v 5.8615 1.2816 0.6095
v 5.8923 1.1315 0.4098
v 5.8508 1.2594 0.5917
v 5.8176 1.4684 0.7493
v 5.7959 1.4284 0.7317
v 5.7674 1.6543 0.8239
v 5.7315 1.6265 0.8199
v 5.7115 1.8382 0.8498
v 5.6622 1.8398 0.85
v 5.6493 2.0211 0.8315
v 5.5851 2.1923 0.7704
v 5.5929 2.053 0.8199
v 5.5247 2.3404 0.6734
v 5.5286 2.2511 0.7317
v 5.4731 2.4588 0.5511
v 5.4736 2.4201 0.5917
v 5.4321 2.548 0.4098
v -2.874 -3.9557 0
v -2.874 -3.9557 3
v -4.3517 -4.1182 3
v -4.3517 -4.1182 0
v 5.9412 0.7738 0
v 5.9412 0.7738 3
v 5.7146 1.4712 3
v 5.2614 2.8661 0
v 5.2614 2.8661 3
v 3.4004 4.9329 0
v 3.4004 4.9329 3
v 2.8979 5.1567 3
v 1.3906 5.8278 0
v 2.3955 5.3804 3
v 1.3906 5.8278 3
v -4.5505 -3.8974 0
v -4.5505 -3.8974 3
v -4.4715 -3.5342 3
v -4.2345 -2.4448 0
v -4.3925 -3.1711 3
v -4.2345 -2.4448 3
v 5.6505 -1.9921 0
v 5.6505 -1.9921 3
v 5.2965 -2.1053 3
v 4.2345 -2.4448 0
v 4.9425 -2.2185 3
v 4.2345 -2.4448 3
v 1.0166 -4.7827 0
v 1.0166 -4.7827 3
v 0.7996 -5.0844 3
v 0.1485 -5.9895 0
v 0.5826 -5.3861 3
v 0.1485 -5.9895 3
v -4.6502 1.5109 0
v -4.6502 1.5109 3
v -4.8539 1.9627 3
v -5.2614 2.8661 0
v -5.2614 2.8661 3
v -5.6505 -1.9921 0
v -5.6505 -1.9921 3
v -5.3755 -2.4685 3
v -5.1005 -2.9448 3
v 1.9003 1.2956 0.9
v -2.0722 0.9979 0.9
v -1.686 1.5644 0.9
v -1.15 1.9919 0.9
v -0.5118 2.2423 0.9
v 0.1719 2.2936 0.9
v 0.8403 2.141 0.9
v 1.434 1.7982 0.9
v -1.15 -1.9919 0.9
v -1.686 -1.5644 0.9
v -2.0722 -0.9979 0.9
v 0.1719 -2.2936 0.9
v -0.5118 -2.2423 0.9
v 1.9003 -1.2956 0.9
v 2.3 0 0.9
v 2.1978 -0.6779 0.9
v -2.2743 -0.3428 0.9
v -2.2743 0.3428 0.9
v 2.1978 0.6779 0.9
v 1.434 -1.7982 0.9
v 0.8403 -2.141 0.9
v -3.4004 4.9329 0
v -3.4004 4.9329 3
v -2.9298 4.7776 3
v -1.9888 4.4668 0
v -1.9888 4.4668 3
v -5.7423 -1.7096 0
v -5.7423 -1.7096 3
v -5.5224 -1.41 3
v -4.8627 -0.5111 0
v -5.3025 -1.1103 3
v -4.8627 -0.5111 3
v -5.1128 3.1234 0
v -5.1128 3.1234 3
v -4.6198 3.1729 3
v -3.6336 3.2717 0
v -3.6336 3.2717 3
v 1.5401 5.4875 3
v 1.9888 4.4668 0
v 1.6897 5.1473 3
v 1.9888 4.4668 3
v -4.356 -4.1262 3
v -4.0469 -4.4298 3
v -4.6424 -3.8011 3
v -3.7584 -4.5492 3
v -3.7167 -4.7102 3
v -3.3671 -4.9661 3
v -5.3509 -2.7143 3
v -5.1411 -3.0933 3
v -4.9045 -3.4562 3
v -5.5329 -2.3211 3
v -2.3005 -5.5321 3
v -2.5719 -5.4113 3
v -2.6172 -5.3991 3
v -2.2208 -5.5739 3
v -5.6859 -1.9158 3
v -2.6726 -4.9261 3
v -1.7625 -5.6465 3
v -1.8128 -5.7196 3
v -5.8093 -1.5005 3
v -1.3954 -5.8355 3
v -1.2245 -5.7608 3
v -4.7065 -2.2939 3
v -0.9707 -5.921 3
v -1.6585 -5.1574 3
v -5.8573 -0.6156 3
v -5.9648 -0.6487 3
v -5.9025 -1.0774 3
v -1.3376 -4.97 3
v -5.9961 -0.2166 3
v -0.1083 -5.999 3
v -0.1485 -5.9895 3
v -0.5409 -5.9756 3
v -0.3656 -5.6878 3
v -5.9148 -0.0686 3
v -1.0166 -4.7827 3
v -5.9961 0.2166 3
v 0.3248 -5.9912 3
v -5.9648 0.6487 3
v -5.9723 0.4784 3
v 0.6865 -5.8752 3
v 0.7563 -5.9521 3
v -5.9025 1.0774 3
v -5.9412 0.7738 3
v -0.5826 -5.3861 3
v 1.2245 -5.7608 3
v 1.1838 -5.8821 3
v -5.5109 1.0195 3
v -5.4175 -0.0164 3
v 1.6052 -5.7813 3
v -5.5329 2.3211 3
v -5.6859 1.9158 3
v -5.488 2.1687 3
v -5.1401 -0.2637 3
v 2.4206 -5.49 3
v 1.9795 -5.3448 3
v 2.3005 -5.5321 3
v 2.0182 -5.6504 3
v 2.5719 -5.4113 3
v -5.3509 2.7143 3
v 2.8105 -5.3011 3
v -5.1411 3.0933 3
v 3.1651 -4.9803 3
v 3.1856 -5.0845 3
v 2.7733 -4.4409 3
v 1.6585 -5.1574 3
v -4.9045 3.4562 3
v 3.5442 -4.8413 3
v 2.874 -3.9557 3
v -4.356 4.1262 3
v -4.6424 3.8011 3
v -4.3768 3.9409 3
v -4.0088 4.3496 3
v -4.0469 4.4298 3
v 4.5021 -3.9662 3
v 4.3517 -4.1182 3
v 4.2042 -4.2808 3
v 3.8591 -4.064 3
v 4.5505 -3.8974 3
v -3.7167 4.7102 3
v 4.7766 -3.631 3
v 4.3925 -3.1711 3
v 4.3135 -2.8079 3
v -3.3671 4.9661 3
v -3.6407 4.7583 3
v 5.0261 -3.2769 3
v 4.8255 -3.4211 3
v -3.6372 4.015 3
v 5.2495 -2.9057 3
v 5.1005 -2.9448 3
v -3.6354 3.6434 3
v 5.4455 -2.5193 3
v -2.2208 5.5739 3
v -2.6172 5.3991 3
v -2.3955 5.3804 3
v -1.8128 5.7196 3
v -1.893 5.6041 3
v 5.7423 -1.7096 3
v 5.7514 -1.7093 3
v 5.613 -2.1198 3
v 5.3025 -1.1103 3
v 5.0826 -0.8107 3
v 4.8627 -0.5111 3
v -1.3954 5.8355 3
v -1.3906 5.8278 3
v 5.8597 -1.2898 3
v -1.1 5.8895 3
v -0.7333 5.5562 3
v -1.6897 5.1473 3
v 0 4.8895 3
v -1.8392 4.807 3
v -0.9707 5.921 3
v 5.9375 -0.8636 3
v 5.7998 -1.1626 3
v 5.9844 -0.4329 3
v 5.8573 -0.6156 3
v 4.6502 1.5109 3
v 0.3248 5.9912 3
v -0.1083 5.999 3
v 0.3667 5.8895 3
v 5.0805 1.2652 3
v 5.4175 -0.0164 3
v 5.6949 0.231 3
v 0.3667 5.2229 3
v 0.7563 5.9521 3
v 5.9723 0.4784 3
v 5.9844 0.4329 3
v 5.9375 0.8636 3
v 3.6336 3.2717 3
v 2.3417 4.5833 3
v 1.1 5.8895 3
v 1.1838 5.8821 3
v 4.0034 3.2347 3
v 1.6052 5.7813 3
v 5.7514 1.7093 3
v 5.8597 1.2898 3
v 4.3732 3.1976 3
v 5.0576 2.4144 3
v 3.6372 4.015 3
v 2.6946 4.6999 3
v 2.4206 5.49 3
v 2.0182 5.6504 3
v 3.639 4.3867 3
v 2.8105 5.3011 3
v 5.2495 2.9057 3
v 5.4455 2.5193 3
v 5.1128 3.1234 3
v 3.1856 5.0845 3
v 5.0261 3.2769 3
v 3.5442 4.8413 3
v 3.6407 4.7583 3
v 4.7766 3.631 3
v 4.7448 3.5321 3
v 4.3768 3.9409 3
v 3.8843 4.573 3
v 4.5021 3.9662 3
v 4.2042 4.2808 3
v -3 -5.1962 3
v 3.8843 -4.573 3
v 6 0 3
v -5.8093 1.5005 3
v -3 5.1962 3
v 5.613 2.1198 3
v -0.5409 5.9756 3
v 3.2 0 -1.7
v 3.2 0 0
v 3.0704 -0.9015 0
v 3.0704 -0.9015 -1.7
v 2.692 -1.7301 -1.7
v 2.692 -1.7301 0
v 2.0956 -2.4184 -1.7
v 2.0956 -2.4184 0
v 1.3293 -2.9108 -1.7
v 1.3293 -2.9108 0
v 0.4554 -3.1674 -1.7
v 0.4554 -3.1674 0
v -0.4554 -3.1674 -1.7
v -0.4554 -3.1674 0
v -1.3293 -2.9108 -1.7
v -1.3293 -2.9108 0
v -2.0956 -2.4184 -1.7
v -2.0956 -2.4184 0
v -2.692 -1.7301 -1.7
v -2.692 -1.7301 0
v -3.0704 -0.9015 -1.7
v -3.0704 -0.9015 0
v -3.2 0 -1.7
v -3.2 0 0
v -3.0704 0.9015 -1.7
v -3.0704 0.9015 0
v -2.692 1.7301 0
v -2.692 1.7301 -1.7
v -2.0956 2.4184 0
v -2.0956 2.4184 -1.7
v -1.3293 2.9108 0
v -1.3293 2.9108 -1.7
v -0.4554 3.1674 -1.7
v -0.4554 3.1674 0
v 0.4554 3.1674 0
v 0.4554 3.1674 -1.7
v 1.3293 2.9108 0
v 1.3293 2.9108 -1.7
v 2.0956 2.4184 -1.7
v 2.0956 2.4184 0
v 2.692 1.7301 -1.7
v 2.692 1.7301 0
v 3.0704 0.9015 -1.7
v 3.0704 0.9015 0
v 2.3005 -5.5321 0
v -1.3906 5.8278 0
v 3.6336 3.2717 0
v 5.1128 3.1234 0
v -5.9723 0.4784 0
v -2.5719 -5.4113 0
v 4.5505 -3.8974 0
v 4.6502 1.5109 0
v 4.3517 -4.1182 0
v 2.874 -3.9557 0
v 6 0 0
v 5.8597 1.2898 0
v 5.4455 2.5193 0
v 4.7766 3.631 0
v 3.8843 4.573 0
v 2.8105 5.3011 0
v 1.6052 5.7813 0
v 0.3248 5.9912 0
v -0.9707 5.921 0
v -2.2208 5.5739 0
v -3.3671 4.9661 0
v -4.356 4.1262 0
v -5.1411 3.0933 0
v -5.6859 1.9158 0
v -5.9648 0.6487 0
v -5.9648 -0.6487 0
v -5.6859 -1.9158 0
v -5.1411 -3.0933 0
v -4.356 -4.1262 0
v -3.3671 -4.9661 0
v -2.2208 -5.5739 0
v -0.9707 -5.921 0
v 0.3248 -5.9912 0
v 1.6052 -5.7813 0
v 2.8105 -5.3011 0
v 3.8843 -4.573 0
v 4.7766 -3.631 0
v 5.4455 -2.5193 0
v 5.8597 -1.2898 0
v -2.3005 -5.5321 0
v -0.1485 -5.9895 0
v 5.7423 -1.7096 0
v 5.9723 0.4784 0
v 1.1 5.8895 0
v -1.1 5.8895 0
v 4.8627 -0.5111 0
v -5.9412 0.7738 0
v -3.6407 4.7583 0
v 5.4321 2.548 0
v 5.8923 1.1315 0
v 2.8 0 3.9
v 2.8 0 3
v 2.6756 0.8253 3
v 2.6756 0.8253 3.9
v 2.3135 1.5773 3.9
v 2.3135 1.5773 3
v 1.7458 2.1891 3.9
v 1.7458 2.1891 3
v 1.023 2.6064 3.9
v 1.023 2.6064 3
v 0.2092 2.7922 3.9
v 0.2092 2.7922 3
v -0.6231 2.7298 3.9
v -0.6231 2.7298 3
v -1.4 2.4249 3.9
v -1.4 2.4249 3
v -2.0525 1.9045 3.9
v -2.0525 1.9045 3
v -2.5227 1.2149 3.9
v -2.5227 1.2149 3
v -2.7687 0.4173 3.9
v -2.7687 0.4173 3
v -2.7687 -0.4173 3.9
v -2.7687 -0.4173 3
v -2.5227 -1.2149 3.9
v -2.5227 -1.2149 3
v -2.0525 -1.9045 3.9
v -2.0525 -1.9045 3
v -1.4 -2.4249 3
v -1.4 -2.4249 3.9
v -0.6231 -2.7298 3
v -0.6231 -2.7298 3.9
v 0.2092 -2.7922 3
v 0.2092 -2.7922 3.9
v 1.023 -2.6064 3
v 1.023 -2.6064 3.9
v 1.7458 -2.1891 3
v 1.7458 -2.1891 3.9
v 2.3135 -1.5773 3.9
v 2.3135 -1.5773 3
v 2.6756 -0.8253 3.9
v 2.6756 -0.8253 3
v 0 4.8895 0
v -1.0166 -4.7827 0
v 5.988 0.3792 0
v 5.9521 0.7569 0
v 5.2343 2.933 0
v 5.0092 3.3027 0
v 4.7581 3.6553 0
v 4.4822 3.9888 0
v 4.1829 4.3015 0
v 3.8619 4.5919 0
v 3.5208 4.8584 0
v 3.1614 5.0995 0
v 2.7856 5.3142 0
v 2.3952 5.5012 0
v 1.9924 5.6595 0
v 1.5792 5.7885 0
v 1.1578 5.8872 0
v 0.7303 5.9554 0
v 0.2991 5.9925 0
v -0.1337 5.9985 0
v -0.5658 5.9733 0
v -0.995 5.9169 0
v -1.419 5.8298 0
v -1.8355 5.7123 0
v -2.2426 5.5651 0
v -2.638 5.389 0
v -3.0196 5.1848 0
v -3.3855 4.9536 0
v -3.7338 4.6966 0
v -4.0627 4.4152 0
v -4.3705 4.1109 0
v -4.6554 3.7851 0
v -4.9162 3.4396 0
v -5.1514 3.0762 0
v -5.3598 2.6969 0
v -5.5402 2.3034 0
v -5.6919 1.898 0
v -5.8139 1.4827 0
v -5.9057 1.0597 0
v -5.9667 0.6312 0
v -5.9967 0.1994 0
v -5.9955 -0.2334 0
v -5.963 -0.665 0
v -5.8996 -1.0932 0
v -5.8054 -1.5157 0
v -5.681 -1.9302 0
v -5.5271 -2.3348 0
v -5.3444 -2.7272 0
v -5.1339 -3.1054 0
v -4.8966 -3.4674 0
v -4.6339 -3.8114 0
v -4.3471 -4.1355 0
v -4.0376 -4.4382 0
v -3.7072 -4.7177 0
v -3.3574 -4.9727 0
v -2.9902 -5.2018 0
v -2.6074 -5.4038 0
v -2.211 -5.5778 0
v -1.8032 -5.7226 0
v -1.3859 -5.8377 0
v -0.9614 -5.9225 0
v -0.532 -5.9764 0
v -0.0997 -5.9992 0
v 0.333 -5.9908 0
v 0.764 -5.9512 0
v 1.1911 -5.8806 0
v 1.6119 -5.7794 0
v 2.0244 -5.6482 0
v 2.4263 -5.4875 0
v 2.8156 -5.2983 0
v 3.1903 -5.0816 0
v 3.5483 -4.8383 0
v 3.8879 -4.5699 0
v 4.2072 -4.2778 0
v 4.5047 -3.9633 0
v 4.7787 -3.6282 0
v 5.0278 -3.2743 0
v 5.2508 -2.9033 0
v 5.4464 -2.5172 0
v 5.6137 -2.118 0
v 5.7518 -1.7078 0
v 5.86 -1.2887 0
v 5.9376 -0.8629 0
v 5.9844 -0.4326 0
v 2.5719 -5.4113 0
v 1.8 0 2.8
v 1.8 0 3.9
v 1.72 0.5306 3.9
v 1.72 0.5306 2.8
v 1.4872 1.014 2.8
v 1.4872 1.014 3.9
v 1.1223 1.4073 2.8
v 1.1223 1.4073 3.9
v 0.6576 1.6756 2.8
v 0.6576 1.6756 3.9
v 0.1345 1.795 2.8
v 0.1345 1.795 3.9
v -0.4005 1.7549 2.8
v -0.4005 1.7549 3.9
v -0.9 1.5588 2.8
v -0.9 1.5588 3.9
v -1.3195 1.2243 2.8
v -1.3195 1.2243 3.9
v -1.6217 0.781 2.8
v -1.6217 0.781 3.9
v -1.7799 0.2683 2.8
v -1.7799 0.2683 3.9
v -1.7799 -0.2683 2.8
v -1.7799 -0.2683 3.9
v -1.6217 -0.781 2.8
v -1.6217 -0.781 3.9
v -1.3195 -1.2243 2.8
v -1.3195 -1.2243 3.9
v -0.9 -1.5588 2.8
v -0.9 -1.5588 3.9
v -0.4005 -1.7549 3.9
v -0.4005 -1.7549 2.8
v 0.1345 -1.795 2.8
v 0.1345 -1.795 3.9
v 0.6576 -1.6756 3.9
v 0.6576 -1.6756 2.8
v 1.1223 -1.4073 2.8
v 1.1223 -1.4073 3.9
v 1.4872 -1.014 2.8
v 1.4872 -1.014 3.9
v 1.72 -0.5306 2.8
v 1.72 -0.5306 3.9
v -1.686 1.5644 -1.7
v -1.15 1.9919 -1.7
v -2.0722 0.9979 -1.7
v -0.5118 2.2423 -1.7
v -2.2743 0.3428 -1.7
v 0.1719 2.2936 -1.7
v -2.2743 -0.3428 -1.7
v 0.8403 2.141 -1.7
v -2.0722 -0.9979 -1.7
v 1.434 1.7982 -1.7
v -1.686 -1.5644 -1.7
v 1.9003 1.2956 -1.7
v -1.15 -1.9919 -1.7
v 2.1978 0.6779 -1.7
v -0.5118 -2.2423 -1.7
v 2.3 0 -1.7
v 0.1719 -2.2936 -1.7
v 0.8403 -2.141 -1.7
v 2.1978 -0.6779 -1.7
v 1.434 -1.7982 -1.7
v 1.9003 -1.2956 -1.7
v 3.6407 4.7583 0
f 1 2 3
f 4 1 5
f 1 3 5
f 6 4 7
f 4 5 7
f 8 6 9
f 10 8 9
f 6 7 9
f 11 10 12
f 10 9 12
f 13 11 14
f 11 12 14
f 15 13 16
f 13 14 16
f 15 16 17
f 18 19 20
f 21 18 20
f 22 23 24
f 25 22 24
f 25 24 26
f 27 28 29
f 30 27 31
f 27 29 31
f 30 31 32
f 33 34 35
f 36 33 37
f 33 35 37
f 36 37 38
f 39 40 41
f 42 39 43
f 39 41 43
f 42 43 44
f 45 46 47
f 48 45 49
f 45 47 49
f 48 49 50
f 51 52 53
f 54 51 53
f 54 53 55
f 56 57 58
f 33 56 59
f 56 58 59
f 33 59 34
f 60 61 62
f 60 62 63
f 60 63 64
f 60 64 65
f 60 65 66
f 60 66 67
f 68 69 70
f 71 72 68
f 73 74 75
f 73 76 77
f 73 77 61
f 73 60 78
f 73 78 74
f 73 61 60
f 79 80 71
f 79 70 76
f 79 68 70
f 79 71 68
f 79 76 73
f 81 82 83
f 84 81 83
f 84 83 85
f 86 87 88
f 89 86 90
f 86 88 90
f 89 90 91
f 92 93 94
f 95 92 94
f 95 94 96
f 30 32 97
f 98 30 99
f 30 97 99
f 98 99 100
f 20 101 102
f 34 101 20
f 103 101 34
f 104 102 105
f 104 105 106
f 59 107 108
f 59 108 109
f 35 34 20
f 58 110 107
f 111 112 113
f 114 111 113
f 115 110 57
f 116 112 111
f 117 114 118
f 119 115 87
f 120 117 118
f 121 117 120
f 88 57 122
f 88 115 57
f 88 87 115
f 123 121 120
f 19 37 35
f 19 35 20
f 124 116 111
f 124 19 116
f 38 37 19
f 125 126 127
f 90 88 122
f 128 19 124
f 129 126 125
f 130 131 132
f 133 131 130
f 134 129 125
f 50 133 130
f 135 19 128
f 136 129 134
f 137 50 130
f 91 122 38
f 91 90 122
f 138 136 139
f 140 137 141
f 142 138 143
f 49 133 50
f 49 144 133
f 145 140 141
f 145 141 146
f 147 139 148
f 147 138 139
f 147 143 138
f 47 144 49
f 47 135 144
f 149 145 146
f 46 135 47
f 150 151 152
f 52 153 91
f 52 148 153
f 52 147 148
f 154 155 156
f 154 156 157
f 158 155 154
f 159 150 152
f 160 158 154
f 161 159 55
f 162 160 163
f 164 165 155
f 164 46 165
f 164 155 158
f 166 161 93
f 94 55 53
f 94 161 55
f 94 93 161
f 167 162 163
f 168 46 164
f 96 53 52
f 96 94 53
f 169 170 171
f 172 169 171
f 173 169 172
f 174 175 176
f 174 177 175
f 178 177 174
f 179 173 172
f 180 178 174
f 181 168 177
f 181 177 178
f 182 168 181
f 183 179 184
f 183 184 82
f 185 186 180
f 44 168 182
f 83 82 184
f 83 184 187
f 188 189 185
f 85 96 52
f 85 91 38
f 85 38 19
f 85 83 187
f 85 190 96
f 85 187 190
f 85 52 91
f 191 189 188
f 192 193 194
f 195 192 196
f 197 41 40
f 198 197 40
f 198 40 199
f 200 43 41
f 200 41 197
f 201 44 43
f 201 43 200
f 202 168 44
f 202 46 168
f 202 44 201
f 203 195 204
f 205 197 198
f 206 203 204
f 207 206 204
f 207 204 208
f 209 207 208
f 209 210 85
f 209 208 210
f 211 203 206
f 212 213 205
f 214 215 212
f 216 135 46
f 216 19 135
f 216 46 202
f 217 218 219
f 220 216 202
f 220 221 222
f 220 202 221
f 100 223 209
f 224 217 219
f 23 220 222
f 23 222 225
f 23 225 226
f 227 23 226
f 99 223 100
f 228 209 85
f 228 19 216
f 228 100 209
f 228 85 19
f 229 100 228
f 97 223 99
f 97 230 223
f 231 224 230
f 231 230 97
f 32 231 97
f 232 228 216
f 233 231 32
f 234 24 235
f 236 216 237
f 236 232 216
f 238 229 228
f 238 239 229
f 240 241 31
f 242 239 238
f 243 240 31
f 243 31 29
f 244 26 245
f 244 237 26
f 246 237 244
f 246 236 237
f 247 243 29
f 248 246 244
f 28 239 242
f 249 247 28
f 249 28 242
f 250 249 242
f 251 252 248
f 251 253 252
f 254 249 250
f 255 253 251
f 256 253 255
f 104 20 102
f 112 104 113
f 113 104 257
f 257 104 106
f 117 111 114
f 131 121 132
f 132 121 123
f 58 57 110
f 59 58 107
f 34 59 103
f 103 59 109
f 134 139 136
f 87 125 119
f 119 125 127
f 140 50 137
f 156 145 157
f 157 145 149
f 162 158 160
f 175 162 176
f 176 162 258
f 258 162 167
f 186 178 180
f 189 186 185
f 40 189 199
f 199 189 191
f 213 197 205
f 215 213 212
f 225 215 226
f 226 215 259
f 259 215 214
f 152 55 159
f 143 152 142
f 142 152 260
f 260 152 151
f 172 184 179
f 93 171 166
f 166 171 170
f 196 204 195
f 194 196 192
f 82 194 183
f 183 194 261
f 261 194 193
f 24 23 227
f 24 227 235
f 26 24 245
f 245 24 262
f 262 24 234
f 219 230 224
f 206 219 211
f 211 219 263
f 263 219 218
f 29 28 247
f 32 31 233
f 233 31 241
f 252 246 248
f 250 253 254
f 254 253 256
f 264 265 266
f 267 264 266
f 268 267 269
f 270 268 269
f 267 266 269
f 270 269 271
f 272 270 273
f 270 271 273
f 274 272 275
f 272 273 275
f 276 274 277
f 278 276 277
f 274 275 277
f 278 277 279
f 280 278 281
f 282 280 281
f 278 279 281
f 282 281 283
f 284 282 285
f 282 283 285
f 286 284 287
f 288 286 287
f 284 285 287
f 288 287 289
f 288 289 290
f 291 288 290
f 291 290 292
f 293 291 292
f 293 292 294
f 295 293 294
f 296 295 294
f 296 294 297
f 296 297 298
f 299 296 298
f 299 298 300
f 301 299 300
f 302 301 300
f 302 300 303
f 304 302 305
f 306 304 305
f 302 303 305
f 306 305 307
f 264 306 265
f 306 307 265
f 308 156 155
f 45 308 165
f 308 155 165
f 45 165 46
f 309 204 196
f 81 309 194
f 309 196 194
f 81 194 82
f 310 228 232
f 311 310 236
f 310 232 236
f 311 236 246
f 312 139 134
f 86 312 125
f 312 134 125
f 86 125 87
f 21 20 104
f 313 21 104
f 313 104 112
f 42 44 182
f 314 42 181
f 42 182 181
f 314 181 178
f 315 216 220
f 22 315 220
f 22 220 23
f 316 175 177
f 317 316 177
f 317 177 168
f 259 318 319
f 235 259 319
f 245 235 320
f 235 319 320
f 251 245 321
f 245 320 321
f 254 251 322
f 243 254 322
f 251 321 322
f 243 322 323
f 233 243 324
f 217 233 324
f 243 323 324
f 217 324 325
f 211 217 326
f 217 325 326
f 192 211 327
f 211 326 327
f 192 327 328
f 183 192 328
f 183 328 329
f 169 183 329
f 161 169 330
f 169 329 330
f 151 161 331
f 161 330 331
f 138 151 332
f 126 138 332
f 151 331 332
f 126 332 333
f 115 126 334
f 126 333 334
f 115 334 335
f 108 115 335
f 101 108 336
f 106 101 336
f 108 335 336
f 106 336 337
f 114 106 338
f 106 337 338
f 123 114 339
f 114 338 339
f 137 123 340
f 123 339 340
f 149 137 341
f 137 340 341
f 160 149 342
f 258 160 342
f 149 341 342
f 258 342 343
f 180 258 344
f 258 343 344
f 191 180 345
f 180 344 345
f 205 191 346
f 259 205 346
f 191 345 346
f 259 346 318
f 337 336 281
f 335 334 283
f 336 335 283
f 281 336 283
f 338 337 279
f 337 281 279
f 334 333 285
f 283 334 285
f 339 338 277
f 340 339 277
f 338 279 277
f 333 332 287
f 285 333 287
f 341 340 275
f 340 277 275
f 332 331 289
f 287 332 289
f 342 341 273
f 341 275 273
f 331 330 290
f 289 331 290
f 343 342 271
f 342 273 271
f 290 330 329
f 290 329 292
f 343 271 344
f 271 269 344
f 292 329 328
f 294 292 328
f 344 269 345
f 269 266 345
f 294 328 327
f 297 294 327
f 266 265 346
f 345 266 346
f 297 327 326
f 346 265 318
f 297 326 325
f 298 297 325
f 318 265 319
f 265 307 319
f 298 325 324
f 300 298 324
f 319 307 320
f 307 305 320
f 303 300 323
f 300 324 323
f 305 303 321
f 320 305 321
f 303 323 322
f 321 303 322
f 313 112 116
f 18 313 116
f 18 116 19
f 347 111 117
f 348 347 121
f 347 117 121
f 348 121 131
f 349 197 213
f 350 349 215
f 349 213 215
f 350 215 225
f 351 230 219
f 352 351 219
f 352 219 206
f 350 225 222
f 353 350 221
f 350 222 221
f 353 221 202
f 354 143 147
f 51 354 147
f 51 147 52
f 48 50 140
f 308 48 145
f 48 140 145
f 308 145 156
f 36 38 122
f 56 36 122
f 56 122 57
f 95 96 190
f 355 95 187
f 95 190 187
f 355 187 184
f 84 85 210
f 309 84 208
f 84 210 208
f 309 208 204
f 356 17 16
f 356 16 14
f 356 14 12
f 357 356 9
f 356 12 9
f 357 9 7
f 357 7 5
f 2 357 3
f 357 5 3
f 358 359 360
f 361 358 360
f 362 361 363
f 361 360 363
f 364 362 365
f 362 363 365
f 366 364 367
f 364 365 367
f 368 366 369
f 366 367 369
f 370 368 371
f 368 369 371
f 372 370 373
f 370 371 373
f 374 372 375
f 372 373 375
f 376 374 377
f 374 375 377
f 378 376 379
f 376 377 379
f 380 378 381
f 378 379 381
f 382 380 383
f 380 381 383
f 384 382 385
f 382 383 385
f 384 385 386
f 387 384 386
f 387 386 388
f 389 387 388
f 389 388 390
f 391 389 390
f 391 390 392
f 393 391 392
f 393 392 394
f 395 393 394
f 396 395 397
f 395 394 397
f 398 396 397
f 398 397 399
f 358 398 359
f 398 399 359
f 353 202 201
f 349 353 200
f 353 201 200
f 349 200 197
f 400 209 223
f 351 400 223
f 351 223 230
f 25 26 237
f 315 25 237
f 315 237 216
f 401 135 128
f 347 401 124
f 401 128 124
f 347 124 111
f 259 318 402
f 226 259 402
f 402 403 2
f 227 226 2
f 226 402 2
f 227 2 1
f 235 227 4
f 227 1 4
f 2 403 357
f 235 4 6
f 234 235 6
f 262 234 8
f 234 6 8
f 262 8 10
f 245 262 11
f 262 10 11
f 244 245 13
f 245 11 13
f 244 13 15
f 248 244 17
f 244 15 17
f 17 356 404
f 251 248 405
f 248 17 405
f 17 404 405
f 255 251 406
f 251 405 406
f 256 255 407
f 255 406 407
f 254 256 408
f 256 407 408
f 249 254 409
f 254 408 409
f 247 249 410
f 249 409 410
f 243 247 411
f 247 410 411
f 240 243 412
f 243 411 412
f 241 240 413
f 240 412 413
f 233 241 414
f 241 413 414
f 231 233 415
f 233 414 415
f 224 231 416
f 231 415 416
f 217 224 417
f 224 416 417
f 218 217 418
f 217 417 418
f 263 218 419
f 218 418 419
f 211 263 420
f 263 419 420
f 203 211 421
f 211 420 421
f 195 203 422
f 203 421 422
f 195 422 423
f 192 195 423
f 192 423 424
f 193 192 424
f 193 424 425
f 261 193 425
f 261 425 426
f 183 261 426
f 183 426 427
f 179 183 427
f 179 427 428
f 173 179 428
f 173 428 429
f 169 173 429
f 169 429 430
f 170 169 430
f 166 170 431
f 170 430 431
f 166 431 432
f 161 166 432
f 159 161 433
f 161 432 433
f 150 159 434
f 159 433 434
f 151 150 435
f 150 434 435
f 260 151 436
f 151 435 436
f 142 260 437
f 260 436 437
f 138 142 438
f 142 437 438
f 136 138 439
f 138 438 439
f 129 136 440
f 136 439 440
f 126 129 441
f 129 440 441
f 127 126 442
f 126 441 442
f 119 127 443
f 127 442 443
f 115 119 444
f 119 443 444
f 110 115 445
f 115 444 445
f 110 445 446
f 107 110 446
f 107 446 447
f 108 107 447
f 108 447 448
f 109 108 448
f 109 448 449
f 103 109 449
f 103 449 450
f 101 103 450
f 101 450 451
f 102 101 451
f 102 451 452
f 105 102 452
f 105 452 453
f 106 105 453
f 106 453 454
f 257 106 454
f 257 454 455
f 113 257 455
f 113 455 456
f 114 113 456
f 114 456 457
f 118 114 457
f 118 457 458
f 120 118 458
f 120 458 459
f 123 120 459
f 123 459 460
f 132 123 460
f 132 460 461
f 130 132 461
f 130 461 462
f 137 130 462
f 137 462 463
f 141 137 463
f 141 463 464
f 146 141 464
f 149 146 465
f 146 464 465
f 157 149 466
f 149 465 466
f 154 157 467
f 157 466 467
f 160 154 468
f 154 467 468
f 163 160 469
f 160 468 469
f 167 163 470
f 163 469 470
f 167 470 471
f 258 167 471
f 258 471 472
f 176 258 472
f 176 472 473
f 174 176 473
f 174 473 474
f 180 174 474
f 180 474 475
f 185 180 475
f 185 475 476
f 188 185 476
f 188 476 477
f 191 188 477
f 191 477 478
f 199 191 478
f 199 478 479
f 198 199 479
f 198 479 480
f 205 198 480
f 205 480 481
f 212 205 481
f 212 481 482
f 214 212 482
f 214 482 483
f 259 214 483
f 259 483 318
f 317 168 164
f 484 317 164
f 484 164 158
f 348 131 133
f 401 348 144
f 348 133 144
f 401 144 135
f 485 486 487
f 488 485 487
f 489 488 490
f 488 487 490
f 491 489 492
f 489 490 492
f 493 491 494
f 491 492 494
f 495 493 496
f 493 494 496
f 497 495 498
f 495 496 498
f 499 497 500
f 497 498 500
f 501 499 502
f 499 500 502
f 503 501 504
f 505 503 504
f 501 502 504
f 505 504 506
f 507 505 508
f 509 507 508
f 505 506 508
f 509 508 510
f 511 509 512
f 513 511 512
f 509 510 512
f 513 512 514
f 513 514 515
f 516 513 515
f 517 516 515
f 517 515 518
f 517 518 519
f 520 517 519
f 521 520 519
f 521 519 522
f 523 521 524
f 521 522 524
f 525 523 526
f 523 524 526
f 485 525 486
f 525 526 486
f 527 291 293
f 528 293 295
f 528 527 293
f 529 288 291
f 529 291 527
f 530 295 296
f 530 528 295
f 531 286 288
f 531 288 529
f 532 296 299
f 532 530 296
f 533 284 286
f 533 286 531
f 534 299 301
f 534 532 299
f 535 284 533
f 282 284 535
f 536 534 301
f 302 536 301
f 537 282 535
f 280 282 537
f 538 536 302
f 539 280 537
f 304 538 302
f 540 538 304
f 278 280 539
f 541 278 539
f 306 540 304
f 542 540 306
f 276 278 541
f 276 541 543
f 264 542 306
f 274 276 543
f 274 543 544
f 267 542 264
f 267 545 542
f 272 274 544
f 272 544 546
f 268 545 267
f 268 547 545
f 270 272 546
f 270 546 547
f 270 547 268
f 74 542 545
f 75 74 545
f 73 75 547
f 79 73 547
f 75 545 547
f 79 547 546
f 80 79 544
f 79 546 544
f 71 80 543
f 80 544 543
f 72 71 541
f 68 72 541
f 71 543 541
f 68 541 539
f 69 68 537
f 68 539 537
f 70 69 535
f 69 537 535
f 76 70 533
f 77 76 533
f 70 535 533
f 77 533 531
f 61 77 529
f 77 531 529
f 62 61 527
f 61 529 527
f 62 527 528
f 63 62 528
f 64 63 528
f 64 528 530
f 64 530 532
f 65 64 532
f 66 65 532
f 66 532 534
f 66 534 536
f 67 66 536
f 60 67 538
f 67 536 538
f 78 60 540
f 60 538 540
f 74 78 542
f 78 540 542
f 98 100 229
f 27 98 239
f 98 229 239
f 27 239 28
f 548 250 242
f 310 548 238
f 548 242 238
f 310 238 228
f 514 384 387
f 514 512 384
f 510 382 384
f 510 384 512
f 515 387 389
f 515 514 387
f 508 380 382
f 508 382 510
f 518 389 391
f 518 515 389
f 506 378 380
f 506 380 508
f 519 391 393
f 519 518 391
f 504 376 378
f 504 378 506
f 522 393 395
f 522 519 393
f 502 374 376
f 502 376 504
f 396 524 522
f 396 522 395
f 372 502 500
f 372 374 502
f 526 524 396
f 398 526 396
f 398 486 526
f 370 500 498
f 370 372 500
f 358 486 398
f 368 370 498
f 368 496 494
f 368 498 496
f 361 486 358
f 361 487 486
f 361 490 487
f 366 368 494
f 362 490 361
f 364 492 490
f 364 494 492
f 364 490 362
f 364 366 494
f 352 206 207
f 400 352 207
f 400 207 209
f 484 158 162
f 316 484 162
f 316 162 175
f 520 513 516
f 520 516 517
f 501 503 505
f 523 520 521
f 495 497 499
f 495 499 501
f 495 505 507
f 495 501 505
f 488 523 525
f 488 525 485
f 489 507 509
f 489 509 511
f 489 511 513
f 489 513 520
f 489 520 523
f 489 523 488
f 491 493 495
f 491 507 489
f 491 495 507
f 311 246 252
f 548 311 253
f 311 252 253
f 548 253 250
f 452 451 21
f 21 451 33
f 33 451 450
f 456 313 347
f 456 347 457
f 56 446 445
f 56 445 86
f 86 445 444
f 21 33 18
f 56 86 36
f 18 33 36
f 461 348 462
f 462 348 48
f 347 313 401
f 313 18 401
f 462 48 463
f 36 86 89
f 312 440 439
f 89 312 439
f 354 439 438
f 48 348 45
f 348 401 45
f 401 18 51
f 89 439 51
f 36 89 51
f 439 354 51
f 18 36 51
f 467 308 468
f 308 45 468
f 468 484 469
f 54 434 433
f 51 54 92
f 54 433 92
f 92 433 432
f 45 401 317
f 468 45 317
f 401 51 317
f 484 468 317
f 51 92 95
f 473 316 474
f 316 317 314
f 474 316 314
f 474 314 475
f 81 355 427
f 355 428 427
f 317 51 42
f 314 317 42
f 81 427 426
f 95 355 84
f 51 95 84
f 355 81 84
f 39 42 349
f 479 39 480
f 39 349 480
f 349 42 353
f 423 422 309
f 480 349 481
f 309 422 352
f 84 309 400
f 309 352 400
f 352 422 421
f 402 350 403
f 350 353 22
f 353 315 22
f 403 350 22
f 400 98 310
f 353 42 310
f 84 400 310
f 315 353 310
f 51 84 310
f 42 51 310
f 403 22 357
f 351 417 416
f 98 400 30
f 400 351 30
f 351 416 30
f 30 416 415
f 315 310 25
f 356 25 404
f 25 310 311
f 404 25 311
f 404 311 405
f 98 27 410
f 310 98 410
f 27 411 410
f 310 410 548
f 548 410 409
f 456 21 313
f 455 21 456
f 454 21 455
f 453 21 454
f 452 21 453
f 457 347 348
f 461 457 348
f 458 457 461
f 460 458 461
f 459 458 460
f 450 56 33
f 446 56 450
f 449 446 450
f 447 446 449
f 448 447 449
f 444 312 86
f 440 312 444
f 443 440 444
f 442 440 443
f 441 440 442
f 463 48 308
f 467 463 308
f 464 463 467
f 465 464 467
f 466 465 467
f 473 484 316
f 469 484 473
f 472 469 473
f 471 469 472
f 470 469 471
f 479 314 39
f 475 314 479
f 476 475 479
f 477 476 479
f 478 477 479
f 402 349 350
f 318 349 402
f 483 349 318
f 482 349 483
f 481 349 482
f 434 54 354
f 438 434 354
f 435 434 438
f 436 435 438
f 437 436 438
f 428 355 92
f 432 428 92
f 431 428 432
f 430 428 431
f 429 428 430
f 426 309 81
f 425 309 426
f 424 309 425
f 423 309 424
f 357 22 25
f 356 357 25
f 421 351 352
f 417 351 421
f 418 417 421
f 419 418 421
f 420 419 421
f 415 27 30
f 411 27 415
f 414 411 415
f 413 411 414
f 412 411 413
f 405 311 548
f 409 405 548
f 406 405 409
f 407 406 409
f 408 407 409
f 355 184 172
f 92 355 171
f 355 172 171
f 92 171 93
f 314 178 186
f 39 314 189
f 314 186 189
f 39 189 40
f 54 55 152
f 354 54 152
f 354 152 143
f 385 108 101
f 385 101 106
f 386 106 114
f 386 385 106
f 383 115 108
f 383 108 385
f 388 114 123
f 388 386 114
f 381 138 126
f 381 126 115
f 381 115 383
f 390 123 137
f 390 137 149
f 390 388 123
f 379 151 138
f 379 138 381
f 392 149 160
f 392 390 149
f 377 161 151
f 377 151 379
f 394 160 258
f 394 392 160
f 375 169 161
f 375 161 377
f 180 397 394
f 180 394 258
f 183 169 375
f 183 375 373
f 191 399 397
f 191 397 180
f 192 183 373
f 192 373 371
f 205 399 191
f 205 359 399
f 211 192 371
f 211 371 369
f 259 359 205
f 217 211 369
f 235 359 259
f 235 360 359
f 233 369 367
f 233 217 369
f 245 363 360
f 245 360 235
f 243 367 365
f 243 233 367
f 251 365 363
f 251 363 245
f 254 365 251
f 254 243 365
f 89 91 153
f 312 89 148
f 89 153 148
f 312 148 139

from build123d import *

# Parameters (mm, degrees)
SKETCH_R           = 6
PAD_DEPTH          = 3
SKETCH001_R        = 2.8
PAD001_DEPTH       = 0.9
SKETCH002_R        = 1.8
POCKET_DEPTH       = 1.1
SKETCH003_R        = 3.2
PAD002_DEPTH       = 1.7
SKETCH004_R        = 2.3
POCKET001_DEPTH    = 2.6
POCKET003_DEPTH    = 37.468376
POLARPATTERN_COUNT = 15
SKETCH008_R        = 0.85
POCKET004_DEPTH    = 1.607836


with BuildPart() as main_body:
    # Sketch → Pad (new body)
    with BuildSketch(Plane.XY):
        Circle(SKETCH_R)
    extrude(amount=PAD_DEPTH)


with BuildPart() as pocket001:
    # Pad001 base: copy of main-body
    add(main_body.part)

    # Sketch001 → Pad001 (new body)
    with BuildSketch(Plane.XY.offset(3)):
        Circle(SKETCH001_R)
    extrude(amount=PAD001_DEPTH)

    # Sketch002 → Pocket (cut)
    with BuildSketch(Plane.XY.offset(3.9)):
        Circle(SKETCH002_R)
    extrude(amount=-POCKET_DEPTH, mode=Mode.SUBTRACT)

    # Sketch003 → Pad002 (new body)
    with BuildSketch(Plane(origin=(0, 0, 0), x_dir=(1, 0, 0), z_dir=(0, 0, -1))):
        Circle(SKETCH003_R)
    extrude(amount=PAD002_DEPTH)

    # Sketch004 → Pocket001 (cut)
    with BuildSketch(Plane(origin=(0, 0, -1.7), x_dir=(1, 0, 0), z_dir=(0, 0, -1))):
        Circle(SKETCH004_R)
    extrude(amount=-POCKET001_DEPTH, mode=Mode.SUBTRACT)


with BuildPart() as pocket004:
    # Pocket003 base: copy of main-body
    add(main_body.part)

    # Sketch007 → Pocket003 (cut, through all)
    with BuildSketch(Plane.XY.offset(3)):
        Polygon((-1.1, 5.889533), (0, 4.889533), (1.1, 5.889533), align=None)
    pocket003 = extrude(amount=-POCKET003_DEPTH, mode=Mode.SUBTRACT)

    # PolarPattern: Pocket003 ×15 about axis
    polarpattern_axis = Axis((0, 0, 3), (0, 0, 1))
    for i in range(1, POLARPATTERN_COUNT):
        add(pocket003.rotate(polarpattern_axis, i * 360 / POLARPATTERN_COUNT), mode=Mode.SUBTRACT)

    # Sketch008 → Pocket004 (cut, through all)
    with BuildSketch(Plane(origin=(5.662215, 1.839765, 0), x_dir=(0.309017, -0.951057, 0), z_dir=(-0.951057, -0.309017, 0))):
        Circle(SKETCH008_R)
    extrude(amount=-POCKET004_DEPTH, mode=Mode.SUBTRACT)


solid = Compound([pocket001.part, pocket004.part])
